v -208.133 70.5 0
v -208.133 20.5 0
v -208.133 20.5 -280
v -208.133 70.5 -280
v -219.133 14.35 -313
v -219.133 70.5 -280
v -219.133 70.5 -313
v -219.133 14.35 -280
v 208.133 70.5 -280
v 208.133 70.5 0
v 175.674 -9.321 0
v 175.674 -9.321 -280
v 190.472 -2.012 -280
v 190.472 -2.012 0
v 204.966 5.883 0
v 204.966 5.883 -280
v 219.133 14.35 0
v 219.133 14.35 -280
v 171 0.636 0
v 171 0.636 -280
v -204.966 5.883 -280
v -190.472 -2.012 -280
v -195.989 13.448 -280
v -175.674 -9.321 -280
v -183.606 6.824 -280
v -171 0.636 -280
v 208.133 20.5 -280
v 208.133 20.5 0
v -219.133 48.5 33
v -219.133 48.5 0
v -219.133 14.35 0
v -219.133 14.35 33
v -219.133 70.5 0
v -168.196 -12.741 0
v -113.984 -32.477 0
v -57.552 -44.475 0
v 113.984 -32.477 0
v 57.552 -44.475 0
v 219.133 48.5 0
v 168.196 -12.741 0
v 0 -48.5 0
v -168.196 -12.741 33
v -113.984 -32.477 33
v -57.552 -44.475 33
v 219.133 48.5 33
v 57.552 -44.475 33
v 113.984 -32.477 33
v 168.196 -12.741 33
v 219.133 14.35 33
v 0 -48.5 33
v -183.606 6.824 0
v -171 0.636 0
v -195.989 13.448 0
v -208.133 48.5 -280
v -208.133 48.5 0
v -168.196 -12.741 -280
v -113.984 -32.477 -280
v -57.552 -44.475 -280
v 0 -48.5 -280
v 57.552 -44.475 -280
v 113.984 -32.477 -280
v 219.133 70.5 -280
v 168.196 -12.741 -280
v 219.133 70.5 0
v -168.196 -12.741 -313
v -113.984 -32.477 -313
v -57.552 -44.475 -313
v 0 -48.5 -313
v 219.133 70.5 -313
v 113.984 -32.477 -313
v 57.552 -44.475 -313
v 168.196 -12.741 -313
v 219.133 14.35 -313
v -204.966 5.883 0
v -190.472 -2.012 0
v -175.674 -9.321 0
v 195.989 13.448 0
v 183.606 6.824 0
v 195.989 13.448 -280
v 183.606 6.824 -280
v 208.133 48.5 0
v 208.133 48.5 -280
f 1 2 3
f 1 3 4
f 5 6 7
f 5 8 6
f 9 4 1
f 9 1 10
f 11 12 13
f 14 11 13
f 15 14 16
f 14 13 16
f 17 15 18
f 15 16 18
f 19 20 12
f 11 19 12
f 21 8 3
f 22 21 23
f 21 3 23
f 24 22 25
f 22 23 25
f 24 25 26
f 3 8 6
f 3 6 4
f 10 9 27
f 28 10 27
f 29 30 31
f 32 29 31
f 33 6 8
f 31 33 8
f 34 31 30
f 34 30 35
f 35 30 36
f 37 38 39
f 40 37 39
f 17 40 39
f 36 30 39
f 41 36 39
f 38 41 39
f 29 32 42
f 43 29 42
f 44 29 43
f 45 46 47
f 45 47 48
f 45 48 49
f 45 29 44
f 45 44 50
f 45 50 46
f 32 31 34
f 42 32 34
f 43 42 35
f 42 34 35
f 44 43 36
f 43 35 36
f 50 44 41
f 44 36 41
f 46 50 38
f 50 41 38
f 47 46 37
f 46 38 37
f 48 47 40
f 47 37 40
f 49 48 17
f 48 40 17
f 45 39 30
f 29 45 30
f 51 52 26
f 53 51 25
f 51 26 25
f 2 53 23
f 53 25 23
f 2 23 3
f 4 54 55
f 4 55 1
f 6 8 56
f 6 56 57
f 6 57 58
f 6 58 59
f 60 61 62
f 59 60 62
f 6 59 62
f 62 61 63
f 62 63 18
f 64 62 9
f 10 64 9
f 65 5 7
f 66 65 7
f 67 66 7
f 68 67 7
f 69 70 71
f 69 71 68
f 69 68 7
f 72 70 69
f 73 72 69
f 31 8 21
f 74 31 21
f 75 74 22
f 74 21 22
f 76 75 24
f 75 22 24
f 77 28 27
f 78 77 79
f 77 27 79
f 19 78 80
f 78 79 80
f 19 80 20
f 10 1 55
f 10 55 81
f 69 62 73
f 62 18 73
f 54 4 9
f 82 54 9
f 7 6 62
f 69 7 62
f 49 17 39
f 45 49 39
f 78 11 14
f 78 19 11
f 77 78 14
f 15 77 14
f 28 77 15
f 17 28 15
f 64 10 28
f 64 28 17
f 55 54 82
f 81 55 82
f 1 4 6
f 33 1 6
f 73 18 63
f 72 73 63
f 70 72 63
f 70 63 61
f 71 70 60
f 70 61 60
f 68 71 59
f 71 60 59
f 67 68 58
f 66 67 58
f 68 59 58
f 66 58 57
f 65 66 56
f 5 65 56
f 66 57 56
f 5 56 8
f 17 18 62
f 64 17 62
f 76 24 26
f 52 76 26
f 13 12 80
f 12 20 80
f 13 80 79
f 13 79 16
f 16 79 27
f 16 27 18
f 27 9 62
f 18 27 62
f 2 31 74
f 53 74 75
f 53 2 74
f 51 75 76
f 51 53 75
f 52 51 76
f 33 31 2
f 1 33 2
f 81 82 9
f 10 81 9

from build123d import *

# Parameters (mm, degrees)
F1_DEPTH = 33
F4_DEPTH = 33
F5_DEPTH = 22
F7_DEPTH = 280
F8_W     = 416.265957
F8_H     = 22
F9_DEPTH = 280


# Not quite as in the source:
# - ends of sketch curves that miss each other by under 0.0002 mm in the source are joined


with BuildPart() as f1:
    # F0 (on Top) → F1 (new body)
    with BuildSketch(Plane.XY):
        with BuildLine():
            Line((219.132978, 48.5), (-219.132979, 48.5))
            Line((-219.132979, 48.5), (-219.132979, 14.349509))
            ThreePointArc((-219.132979, 14.349509), (-4.24e-07, -48.499999), (219.1329780871, 14.3495088607))
            Line((219.1329780871, 14.3495088607), (219.132978, 48.5))
        make_face()
    extrude(amount=F1_DEPTH)


with BuildPart() as f4:
    # F3 (on offset) → F4 (new body)
    with BuildSketch(Plane(origin=(0, 0, -280), x_dir=(1, 0, 0), z_dir=(0, 0, -1))):
        with BuildLine():
            Line((-219.132979, -14.349509), (-219.132979, -48.5))
            Line((-219.132979, -48.5), (219.132978, -48.5))
            Line((219.132978, -48.5), (219.132978, -14.3495088607))
            ThreePointArc((219.132978, -14.3495088607), (-4.24e-07, 48.499999), (-219.132979, -14.349509))
        make_face()
    extrude(amount=F4_DEPTH)

    # F5 (add): a face of the model
    f5_faces = [f4.faces().sort_by_distance(p)[0] for p in [
        (-5e-07, 48.5, -296.5),
    ]]
    extrude(f5_faces, amount=F5_DEPTH)


with BuildPart() as f7:
    # F6 (on face) → F7 (new body)
    with BuildSketch(Plane.XY.offset(-280)):
        with BuildLine():
            ThreePointArc((175.6739587965, -9.3212637837), (197.7579472725, 1.8633071047), (219.1329780245, 14.3495088216))
            Line((219.132978, 14.3495088607), (219.132978, 70.5))
            Line((219.132978, 70.5), (208.132978, 70.5))
            Line((208.132978, 70.5), (208.132978, 20.5000005459))
            ThreePointArc((208.132978, 20.5000005459), (189.82648619, 10.0821389395), (170.9999998518, 0.6363517834))
            Line((170.9999998518, 0.6363517834), (175.6739587965, -9.3212637837))
        make_face()
    extrude(amount=F7_DEPTH)


with BuildPart() as f7b:
    # F6 (on face) → F7, piece 2 (new body)
    with BuildSketch(Plane.XY.offset(-280)):
        with BuildLine():
            Line((-208.132979, 70.5), (-219.132979, 70.5))
            Line((-219.132979, 70.5), (-219.132979, 14.349509))
            ThreePointArc((-219.132979, 14.349509), (-197.7579478249, 1.8633074056), (-175.673959101, -9.3212636408))
            Line((-175.673959101, -9.3212636408), (-171.0000001482, 0.6363519225))
            ThreePointArc((-171.0000001482, 0.6363519225), (-189.8264868494, 10.0821392923), (-208.132979, 20.5000011501))
            Line((-208.132979, 20.5000011501), (-208.132979, 70.5))
        make_face()
    extrude(amount=F7_DEPTH)


with BuildPart() as f9:
    # F8 (on face) → F9 (new body)
    with BuildSketch(Plane.XY.offset(-280)):
        with Locations((-5e-07, 59.5)):
            Rectangle(F8_W, F8_H)
    extrude(amount=F9_DEPTH)


solid = Compound([f1.part, f4.part, f7.part, f7b.part, f9.part])
